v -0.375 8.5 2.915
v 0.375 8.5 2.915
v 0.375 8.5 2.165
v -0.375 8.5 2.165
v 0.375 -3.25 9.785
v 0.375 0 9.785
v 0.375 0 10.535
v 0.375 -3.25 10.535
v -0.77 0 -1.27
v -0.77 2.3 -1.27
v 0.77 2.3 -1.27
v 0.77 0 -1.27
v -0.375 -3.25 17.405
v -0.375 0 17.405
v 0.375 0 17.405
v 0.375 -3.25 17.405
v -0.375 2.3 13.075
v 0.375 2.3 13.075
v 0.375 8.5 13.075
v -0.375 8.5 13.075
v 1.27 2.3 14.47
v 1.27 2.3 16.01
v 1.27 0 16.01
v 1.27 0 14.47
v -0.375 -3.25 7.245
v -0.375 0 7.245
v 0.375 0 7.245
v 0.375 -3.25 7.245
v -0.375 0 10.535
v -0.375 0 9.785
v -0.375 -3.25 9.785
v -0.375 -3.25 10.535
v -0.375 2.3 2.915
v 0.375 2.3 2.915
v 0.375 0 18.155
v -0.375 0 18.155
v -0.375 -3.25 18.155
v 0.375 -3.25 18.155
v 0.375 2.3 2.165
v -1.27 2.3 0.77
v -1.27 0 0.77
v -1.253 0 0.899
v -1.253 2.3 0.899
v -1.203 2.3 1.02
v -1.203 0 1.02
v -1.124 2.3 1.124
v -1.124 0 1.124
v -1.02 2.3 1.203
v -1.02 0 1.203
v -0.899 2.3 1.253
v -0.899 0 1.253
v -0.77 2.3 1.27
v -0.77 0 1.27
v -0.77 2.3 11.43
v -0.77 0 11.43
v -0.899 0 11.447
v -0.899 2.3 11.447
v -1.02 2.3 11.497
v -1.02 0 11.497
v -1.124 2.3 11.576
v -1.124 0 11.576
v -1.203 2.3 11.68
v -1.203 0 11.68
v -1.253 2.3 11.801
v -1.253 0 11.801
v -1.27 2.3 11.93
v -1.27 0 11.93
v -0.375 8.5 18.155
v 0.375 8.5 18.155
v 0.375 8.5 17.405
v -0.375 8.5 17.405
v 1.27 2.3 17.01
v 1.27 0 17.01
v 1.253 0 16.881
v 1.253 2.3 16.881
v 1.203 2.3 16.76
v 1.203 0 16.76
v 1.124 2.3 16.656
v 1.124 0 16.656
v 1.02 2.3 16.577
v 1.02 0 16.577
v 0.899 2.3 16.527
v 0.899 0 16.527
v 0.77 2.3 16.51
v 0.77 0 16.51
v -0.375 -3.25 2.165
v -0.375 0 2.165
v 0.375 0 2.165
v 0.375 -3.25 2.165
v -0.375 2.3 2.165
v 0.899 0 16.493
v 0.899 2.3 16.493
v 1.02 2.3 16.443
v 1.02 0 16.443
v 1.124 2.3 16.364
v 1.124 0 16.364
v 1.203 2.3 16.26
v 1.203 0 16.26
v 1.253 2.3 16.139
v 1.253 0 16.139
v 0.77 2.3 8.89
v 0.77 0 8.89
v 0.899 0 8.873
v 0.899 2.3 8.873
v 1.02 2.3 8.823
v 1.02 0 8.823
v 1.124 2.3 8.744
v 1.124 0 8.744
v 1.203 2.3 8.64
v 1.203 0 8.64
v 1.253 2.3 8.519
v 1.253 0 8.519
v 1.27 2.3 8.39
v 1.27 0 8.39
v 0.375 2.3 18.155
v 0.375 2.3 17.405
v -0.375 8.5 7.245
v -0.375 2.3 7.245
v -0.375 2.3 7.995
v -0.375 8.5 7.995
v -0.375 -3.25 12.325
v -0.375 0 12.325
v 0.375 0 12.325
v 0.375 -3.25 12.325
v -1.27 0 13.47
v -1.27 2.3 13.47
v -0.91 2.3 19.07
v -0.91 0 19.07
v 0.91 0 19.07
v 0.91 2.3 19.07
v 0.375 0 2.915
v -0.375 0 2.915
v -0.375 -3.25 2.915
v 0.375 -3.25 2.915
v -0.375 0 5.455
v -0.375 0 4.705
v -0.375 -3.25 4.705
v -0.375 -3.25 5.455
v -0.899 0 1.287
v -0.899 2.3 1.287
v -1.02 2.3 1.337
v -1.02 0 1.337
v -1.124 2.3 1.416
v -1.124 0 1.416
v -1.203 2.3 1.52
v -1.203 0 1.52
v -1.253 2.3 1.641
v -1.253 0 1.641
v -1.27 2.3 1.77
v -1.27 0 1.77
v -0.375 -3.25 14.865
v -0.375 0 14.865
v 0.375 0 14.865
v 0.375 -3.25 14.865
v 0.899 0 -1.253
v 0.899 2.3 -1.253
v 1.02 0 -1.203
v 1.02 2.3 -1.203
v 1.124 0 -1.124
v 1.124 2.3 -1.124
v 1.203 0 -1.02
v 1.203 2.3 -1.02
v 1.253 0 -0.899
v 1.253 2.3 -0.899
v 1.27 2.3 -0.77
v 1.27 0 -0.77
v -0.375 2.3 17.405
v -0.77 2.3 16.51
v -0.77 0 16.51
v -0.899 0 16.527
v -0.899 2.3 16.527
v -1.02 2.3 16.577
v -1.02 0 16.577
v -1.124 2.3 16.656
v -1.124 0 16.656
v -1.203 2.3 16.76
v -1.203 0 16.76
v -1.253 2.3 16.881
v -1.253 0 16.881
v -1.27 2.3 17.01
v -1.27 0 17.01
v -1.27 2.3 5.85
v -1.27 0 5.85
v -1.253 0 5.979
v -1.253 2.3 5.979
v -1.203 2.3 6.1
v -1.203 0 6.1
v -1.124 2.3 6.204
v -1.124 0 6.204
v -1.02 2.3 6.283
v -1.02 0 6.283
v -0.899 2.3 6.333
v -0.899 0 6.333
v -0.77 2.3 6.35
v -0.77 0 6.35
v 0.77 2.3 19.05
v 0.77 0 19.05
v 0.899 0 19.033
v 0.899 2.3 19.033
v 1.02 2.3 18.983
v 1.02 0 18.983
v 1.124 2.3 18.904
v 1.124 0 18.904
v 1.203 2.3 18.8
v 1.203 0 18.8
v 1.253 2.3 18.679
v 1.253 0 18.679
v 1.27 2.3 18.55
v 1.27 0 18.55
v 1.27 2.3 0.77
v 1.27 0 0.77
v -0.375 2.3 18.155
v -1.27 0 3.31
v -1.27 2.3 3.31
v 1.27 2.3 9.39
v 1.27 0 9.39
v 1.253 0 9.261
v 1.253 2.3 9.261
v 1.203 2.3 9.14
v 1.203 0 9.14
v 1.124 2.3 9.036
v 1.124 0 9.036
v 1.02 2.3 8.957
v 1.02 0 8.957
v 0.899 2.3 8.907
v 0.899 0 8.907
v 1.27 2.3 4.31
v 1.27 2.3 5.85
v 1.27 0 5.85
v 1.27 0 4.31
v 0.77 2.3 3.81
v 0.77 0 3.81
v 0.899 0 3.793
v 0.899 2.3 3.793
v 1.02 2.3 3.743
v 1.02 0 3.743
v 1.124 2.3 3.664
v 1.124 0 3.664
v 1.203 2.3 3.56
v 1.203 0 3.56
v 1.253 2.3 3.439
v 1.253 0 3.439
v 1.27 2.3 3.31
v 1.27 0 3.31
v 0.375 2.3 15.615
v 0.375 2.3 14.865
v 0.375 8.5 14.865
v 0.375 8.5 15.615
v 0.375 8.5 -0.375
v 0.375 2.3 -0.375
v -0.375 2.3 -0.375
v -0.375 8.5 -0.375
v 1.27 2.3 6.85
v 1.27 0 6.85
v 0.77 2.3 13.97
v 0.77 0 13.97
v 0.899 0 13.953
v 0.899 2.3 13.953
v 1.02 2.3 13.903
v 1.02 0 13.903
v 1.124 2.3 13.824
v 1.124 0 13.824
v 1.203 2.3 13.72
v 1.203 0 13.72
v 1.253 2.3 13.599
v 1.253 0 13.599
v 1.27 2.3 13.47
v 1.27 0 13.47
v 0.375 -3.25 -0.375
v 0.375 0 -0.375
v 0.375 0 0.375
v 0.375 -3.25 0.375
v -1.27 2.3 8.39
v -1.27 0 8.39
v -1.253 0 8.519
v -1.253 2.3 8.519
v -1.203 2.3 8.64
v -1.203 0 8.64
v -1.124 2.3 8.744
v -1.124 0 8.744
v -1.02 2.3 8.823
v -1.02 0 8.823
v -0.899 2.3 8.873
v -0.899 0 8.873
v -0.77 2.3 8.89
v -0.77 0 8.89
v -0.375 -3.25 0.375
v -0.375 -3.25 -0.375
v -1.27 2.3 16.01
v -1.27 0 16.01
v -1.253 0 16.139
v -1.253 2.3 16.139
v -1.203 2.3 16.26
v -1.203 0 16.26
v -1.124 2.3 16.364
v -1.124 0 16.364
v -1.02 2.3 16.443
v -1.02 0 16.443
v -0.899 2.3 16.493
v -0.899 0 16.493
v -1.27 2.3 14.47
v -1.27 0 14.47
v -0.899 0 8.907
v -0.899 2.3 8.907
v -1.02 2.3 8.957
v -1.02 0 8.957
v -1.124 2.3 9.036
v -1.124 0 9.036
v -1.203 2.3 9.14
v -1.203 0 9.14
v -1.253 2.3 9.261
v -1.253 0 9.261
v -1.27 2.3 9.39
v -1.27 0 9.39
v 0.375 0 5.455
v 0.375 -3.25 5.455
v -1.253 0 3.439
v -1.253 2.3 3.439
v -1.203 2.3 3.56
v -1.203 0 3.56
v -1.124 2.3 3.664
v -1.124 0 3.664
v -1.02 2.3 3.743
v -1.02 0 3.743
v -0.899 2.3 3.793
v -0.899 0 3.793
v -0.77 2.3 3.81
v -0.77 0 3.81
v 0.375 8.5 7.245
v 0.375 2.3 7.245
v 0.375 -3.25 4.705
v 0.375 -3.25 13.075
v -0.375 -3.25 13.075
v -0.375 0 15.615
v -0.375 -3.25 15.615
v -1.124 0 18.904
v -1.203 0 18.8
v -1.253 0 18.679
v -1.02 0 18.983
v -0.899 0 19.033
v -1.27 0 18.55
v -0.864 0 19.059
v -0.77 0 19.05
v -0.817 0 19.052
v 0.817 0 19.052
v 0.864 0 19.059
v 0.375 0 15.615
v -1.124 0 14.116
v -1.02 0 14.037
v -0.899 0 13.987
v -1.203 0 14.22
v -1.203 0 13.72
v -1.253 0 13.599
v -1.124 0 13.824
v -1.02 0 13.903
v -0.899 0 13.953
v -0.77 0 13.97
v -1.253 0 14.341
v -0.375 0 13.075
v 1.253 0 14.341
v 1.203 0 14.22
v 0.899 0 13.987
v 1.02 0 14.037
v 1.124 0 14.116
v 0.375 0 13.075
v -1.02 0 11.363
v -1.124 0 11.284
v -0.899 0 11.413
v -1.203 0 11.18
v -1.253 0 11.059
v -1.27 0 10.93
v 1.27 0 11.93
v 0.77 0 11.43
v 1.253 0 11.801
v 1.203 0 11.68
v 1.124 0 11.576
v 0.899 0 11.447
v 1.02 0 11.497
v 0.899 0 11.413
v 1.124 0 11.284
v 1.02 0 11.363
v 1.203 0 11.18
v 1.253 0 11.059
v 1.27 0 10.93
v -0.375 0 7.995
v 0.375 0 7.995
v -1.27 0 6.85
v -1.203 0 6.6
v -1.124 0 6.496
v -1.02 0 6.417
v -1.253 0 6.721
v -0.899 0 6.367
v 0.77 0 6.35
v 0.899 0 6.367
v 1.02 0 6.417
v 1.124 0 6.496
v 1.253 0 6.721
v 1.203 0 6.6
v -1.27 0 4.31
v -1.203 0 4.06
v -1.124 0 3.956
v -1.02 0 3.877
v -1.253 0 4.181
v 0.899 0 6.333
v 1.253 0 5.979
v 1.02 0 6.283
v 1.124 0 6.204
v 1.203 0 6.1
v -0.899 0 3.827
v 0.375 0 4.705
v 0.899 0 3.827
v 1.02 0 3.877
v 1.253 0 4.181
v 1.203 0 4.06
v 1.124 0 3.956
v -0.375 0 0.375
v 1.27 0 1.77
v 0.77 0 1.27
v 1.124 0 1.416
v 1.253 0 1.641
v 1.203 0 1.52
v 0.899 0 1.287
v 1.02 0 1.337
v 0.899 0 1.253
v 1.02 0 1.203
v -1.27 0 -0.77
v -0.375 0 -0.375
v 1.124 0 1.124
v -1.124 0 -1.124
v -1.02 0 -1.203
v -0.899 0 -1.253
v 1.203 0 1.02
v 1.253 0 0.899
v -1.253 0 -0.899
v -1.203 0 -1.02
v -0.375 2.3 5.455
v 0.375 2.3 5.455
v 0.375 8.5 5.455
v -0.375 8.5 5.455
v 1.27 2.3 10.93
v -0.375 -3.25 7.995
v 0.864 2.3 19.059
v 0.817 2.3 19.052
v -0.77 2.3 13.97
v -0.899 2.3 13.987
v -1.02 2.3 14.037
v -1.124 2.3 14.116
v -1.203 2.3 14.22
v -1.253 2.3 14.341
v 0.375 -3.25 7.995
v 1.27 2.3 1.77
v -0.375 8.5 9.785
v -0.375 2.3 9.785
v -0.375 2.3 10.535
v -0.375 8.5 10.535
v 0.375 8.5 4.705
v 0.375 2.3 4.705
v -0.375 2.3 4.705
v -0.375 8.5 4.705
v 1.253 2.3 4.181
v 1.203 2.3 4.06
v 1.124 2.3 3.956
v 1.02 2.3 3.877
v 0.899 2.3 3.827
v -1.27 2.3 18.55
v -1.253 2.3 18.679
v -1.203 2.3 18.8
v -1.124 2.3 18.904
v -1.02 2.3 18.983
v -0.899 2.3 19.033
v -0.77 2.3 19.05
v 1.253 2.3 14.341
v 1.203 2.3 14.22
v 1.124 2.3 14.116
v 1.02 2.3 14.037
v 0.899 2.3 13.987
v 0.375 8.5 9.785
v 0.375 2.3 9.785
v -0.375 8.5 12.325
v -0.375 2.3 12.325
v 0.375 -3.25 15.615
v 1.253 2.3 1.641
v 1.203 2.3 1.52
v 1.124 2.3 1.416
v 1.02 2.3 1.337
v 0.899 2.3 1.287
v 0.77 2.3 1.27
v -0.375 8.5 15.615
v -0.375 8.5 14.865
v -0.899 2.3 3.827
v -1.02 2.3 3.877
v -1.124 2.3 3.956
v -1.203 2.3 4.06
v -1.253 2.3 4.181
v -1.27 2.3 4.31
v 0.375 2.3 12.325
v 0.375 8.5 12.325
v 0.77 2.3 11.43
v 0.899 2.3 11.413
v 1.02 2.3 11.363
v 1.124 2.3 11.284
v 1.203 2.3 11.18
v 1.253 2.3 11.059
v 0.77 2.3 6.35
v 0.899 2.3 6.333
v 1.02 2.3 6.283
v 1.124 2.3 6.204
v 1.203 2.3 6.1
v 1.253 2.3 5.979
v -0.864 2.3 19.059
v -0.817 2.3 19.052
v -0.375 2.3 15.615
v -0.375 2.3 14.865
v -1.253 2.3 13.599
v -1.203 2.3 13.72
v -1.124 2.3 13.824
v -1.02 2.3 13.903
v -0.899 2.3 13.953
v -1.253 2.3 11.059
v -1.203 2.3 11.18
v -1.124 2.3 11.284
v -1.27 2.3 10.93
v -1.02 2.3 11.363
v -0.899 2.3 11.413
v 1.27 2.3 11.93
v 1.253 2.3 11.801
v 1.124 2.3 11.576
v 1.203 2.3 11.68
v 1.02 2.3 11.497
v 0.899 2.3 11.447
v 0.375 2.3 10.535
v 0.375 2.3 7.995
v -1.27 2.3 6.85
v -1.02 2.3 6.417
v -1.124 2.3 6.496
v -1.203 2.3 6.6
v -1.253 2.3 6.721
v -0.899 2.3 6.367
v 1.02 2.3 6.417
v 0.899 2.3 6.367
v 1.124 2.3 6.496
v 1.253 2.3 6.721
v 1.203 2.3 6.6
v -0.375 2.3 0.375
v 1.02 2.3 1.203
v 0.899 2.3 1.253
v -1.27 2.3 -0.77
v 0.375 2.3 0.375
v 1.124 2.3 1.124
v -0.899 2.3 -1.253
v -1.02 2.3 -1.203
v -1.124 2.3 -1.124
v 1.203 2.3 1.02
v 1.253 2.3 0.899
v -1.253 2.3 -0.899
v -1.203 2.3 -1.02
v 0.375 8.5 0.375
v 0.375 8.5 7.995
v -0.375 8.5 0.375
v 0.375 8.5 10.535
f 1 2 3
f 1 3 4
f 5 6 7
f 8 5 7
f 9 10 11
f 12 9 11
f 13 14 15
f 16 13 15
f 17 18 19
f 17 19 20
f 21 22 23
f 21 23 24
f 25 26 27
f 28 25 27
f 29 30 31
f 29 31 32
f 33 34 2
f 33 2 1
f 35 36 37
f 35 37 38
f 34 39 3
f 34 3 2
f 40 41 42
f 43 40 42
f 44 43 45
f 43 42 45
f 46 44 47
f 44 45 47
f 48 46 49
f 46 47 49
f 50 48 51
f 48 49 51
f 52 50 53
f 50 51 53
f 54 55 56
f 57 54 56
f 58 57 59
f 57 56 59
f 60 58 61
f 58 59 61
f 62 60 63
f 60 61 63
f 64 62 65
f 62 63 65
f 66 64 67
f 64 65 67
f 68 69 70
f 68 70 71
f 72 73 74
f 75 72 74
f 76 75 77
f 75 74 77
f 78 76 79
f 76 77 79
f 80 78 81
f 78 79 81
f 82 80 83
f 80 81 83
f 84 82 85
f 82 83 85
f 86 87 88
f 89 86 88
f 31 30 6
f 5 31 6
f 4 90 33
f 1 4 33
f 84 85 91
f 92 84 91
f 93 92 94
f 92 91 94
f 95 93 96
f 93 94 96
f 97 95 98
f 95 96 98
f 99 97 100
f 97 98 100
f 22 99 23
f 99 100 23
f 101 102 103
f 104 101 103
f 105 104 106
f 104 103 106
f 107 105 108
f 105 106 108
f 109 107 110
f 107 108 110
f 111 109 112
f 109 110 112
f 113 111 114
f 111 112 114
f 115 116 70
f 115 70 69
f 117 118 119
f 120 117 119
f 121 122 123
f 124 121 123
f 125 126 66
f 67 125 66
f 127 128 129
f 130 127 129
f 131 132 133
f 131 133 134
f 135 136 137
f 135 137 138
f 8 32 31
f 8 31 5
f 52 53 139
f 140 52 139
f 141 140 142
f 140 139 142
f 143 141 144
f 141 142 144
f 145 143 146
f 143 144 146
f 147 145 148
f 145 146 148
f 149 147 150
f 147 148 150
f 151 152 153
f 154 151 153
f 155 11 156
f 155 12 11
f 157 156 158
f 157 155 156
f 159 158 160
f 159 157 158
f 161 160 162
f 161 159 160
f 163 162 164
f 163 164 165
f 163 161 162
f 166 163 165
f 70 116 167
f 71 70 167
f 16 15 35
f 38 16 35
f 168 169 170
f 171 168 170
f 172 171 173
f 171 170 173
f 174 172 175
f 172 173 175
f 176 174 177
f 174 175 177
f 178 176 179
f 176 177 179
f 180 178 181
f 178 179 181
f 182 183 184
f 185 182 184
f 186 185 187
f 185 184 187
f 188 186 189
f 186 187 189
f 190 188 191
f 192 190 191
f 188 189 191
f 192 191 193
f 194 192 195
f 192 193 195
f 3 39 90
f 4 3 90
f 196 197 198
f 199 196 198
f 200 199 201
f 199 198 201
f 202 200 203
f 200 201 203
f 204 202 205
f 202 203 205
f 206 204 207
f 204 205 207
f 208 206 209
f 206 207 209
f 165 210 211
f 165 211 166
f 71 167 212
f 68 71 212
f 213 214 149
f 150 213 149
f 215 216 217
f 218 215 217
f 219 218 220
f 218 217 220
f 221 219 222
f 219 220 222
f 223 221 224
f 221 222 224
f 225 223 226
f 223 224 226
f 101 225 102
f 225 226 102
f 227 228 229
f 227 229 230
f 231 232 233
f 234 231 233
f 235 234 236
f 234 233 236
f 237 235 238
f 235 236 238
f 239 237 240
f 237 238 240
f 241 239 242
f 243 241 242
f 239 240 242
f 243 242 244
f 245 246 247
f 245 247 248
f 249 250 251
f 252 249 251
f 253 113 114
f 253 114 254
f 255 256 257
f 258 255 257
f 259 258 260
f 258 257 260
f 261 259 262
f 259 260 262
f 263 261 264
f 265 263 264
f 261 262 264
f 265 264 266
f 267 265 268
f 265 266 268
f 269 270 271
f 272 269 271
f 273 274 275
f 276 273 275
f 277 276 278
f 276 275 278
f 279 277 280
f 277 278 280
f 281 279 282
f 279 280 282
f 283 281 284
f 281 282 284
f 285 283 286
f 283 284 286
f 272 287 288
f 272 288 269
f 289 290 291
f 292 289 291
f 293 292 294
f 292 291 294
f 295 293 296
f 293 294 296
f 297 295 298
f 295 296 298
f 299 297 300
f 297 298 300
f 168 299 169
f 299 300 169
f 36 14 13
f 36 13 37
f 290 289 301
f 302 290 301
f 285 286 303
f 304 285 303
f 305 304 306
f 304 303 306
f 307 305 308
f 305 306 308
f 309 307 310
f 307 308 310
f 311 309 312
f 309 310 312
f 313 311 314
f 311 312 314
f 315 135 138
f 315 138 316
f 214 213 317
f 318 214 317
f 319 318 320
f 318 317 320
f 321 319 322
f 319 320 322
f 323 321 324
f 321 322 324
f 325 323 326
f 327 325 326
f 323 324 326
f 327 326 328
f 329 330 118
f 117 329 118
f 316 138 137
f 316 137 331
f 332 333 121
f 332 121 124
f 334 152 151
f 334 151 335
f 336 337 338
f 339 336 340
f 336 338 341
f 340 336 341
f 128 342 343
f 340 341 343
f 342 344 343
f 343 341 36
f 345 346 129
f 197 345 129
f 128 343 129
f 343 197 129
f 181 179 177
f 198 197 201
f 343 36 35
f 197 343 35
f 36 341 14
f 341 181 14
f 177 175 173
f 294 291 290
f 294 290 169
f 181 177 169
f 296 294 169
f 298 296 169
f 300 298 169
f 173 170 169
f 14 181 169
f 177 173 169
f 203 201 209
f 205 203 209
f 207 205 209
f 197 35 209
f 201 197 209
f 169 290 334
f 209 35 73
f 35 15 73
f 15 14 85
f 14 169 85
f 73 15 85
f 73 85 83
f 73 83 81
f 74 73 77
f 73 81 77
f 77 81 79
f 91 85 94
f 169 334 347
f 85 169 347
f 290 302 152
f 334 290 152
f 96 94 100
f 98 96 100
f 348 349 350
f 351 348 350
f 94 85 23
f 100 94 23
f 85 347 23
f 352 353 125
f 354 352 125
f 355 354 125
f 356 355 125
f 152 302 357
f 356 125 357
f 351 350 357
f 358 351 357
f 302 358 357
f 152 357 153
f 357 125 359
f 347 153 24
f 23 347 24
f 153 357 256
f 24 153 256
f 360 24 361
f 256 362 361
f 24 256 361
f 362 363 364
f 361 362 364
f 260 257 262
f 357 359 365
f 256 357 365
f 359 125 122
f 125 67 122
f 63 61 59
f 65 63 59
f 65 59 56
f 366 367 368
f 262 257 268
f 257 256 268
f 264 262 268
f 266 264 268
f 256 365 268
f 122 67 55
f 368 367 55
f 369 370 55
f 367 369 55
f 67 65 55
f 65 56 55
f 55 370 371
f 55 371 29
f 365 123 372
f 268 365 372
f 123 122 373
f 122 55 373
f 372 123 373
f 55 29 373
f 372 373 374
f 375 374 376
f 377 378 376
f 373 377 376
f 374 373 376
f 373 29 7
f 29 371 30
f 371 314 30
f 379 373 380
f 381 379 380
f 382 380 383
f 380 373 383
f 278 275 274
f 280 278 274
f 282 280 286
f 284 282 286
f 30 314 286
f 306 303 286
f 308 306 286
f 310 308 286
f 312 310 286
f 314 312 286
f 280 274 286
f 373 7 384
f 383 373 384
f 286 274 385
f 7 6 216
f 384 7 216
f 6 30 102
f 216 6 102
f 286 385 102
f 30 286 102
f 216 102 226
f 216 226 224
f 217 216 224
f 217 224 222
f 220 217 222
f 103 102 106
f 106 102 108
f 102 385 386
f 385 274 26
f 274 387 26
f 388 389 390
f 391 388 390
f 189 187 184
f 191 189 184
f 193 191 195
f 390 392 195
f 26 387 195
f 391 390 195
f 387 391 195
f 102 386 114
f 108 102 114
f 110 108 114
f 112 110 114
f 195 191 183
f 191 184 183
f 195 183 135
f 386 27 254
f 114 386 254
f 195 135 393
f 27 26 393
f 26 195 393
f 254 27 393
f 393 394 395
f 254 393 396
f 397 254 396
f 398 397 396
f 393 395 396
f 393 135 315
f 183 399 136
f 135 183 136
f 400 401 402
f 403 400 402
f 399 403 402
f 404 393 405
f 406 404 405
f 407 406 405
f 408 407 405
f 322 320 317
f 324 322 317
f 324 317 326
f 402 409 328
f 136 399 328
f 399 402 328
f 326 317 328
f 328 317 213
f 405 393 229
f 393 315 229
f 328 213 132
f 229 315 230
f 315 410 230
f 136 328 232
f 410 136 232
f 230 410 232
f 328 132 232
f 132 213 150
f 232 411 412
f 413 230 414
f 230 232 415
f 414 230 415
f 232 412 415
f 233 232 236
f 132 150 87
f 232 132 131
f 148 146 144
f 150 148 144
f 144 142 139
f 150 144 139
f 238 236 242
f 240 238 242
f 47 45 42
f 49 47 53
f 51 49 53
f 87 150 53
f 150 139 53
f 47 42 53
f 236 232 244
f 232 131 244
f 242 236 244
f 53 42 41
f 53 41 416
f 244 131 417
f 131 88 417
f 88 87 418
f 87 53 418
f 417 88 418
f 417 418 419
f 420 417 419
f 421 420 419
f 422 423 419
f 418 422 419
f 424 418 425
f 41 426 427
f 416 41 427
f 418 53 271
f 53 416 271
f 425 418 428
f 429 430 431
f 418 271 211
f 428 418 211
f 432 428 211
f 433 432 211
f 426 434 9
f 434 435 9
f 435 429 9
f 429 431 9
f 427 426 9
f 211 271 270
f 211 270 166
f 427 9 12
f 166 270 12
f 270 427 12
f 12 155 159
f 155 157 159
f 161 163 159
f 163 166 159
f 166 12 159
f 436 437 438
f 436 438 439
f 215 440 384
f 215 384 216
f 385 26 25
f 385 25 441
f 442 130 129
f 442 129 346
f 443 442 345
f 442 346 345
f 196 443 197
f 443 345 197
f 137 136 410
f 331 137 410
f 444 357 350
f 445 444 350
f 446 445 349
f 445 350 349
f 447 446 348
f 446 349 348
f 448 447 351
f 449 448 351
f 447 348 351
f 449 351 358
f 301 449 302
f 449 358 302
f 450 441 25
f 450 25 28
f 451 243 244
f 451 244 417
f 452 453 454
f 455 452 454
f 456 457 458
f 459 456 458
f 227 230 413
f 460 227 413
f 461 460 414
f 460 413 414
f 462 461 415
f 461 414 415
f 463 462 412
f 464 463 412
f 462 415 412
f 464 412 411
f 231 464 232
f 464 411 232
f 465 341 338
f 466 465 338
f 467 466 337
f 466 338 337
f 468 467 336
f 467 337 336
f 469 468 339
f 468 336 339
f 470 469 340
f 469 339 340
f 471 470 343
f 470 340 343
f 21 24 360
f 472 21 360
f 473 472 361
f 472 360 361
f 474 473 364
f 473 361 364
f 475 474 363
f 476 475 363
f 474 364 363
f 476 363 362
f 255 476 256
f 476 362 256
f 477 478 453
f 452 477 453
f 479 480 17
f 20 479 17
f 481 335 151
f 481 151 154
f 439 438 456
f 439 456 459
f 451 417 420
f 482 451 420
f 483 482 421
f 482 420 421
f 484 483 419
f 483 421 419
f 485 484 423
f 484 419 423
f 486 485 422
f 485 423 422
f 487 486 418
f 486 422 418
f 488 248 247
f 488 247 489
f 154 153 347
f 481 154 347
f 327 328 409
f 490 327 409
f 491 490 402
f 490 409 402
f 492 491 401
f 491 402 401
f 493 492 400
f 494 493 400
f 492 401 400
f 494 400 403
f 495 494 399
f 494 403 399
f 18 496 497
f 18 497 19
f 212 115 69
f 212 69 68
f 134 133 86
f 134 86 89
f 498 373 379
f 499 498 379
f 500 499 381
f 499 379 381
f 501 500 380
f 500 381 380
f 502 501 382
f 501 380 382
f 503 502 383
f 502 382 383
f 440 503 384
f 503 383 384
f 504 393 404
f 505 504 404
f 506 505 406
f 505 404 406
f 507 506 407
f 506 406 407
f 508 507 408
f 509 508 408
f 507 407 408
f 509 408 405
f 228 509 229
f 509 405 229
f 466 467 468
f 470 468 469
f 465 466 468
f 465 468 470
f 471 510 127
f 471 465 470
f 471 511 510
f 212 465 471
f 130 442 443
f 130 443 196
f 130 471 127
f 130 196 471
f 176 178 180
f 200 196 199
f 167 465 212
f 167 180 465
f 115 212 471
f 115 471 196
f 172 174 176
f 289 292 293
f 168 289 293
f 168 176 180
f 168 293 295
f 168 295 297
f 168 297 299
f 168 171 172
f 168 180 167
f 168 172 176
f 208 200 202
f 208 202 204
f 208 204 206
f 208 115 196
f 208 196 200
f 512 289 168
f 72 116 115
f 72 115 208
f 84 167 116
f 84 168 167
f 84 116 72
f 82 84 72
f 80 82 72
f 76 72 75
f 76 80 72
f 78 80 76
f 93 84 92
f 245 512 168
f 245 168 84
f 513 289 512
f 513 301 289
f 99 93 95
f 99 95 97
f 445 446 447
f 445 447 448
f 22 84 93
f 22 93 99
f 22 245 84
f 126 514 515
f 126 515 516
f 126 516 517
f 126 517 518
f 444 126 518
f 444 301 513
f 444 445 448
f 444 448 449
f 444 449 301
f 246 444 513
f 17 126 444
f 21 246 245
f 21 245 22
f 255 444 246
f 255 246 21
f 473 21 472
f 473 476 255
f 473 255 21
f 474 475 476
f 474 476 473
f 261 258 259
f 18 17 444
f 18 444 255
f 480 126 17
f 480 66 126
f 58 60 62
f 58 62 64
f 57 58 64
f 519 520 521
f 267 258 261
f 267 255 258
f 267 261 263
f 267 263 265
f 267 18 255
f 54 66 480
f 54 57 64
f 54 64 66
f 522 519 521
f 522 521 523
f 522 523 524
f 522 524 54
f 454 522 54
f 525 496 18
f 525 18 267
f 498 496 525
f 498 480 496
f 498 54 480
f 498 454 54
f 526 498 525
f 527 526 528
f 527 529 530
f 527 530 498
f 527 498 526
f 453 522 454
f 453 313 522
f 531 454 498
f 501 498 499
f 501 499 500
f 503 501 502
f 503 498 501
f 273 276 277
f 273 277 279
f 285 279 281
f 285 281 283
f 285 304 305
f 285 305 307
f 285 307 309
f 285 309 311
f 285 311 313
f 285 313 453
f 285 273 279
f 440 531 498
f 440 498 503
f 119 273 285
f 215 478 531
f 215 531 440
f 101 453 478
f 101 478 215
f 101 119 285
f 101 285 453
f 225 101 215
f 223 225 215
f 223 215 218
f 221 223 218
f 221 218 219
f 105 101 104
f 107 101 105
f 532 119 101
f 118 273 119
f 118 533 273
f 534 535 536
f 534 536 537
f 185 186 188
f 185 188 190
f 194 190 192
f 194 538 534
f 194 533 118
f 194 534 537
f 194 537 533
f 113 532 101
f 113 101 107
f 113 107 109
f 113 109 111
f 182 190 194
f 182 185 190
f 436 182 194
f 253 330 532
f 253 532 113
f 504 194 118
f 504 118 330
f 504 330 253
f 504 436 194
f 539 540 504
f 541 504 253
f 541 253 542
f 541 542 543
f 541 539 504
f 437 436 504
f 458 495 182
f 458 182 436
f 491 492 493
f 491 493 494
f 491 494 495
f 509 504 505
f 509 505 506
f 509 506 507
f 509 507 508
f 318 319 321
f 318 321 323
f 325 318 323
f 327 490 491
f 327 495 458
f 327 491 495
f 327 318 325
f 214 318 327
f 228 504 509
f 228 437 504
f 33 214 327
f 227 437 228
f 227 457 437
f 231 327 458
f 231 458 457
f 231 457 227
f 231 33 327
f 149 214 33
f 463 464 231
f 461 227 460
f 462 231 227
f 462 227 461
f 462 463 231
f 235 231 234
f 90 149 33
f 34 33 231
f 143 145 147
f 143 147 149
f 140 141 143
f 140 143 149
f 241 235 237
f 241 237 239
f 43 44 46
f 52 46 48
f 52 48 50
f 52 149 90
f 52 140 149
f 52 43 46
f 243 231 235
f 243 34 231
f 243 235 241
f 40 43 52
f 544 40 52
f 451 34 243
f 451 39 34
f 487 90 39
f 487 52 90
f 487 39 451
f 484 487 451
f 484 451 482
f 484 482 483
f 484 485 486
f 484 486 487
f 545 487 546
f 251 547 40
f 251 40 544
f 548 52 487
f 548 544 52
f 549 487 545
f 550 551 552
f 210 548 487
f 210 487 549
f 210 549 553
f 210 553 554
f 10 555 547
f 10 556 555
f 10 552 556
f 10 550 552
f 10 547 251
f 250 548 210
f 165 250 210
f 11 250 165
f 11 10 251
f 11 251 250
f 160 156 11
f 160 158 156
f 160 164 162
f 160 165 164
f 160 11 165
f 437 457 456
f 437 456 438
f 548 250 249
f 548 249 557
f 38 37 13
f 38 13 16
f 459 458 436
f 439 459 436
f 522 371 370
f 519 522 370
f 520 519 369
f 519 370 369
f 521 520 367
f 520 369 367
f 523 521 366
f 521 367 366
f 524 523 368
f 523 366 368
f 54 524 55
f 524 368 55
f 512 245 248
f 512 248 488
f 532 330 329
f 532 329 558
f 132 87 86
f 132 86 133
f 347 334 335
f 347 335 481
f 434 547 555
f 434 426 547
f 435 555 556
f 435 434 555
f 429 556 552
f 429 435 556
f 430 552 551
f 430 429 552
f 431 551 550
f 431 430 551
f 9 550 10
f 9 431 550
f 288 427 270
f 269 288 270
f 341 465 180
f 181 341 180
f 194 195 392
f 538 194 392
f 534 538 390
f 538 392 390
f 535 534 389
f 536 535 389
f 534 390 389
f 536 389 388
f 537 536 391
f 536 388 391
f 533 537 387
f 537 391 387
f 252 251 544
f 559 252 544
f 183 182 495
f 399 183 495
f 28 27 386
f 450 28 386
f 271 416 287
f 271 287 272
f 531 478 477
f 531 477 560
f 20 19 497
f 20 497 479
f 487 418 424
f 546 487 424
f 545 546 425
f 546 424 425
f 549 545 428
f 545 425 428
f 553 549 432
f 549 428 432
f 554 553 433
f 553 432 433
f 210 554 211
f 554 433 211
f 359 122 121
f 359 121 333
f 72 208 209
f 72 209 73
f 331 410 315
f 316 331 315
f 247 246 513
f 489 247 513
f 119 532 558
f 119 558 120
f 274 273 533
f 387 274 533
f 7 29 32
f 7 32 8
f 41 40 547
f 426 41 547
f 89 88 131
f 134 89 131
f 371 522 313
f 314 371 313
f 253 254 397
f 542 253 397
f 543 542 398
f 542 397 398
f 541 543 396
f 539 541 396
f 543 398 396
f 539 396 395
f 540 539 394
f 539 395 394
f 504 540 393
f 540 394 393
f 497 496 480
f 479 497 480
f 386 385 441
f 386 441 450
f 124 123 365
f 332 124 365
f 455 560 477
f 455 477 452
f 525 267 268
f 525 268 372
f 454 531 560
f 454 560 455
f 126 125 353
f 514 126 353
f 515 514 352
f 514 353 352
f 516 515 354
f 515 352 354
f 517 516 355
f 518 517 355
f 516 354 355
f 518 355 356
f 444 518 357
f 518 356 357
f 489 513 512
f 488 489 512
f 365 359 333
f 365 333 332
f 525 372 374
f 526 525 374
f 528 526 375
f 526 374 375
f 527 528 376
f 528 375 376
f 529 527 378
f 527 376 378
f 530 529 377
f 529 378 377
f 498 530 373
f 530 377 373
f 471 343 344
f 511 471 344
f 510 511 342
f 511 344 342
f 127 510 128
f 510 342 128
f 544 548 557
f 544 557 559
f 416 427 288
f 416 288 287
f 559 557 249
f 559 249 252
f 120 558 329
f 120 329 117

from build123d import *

# Parameters (mm, degrees)
CROQUIS1_W               = 2.54
CROQUIS1_H               = 20.34
SALIENTE_EXTRUIR1_DEPTH  = 2.3
CORTAR_EXTRUIR4_DEPTH    = 2.3
CORTAR_EXTRUIR5_DEPTH    = 2.3
CORTAR_EXTRUIR6_DEPTH    = 2.3
CORTAR_EXTRUIR7_DEPTH    = 2.3
CORTAR_EXTRUIR8_DEPTH    = 2.3
CORTAR_EXTRUIR9_DEPTH    = 2.3
CORTAR_EXTRUIR10_DEPTH   = 2.3
CORTAR_EXTRUIR11_DEPTH   = 2.3
CORTAR_EXTRUIR12_DEPTH   = 2.3
CORTAR_EXTRUIR13_DEPTH   = 2.3
CORTAR_EXTRUIR14_DEPTH   = 2.3
CORTAR_EXTRUIR15_DEPTH   = 2.3
CORTAR_EXTRUIR16_DEPTH   = 2.3
CORTAR_EXTRUIR17_DEPTH   = 2.3
CORTAR_EXTRUIR18_DEPTH   = 2.3
CORTAR_EXTRUIR19_DEPTH   = 2.3
CROQUIS24_W              = 0.75
CROQUIS24_H              = 0.75
SALIENTE_EXTRUIR2_DEPTH  = 3.25
CROQUIS25_W              = 0.75
CROQUIS25_H              = 0.75
SALIENTE_EXTRUIR3_DEPTH  = 6.2
CROQUIS26_W              = 0.75
CROQUIS26_H              = 0.75
SALIENTE_EXTRUIR4_DEPTH  = 6.2
CROQUIS27_W              = 0.75
CROQUIS27_H              = 0.75
SALIENTE_EXTRUIR5_DEPTH  = 6.2
CROQUIS28_W              = 0.75
CROQUIS28_H              = 0.75
SALIENTE_EXTRUIR6_DEPTH  = 6.2
CROQUIS29_W              = 0.75
CROQUIS29_H              = 0.75
SALIENTE_EXTRUIR7_DEPTH  = 6.2
CROQUIS30_W              = 0.75
CROQUIS30_H              = 0.75
SALIENTE_EXTRUIR8_DEPTH  = 6.2
CROQUIS31_W              = 0.75
CROQUIS31_H              = 0.75
SALIENTE_EXTRUIR9_DEPTH  = 6.2
CROQUIS32_W              = 0.75
CROQUIS32_H              = 0.75
SALIENTE_EXTRUIR10_DEPTH = 6.2
CROQUIS37_W              = 0.75
CROQUIS37_H              = 0.75
SALIENTE_EXTRUIR15_DEPTH = 3.25
CROQUIS38_W              = 0.75
CROQUIS38_H              = 0.75
SALIENTE_EXTRUIR16_DEPTH = 3.25
CROQUIS39_W              = 0.75
CROQUIS39_H              = 0.75
SALIENTE_EXTRUIR17_DEPTH = 3.25
CROQUIS40_W              = 0.75
CROQUIS40_H              = 0.75
SALIENTE_EXTRUIR18_DEPTH = 3.25
CROQUIS41_W              = 0.75
CROQUIS41_H              = 0.75
SALIENTE_EXTRUIR19_DEPTH = 3.25
CROQUIS42_W              = 0.75
CROQUIS42_H              = 0.75
SALIENTE_EXTRUIR20_DEPTH = 3.25
CROQUIS43_W              = 0.75
CROQUIS43_H              = 0.75
SALIENTE_EXTRUIR21_DEPTH = 3.25
REDONDEO2_R              = 0.5


with BuildPart() as part:
    # Croquis1 → Saliente-Extruir1 (new body)
    with BuildSketch(Plane(origin=(0, 2.3, 0), x_dir=(1, 0, 0), z_dir=(0, 1, 0))):
        with Locations((0, -8.9)):
            Rectangle(CROQUIS1_W, CROQUIS1_H)
    extrude(amount=-SALIENTE_EXTRUIR1_DEPTH)

    # Croquis5 → Cortar-Extruir4 (cut)
    with BuildSketch(Plane.XZ):
        with BuildLine():
            Line((1.27, 18.55), (1.27, 19.55))
            ThreePointArc((1.27, 19.55), (1.123553391, 19.196446609), (0.77, 19.05))
            ThreePointArc((0.77, 19.05), (1.123553391, 18.903553391), (1.27, 18.55))
        make_face()
    extrude(amount=-CORTAR_EXTRUIR4_DEPTH, mode=Mode.SUBTRACT)

    # Croquis6 → Cortar-Extruir5 (cut)
    with BuildSketch(Plane.XZ):
        with BuildLine():
            Line((1.27, 16.01), (1.27, 17.01))
            ThreePointArc((1.27, 17.01), (1.123553391, 16.656446609), (0.77, 16.51))
            ThreePointArc((0.77, 16.51), (1.123553391, 16.363553391), (1.27, 16.01))
        make_face()
    extrude(amount=-CORTAR_EXTRUIR5_DEPTH, mode=Mode.SUBTRACT)

    # Croquis7 → Cortar-Extruir6 (cut)
    with BuildSketch(Plane.XZ):
        with BuildLine():
            Line((1.27, 13.47), (1.27, 14.47))
            ThreePointArc((1.27, 14.47), (1.123553391, 14.116446609), (0.77, 13.97))
            ThreePointArc((0.77, 13.97), (1.123553391, 13.823553391), (1.27, 13.47))
        make_face()
    extrude(amount=-CORTAR_EXTRUIR6_DEPTH, mode=Mode.SUBTRACT)

    # Croquis8 → Cortar-Extruir7 (cut)
    with BuildSketch(Plane.XZ):
        with BuildLine():
            Line((1.27, 10.93), (1.27, 11.93))
            ThreePointArc((1.27, 11.93), (1.123553391, 11.576446609), (0.77, 11.43))
            ThreePointArc((0.77, 11.43), (1.123553391, 11.283553391), (1.27, 10.93))
        make_face()
    extrude(amount=-CORTAR_EXTRUIR7_DEPTH, mode=Mode.SUBTRACT)

    # Croquis9 → Cortar-Extruir8 (cut)
    with BuildSketch(Plane.XZ):
        with BuildLine():
            Line((1.27, 8.39), (1.27, 9.39))
            ThreePointArc((1.27, 9.39), (1.123553391, 9.036446609), (0.77, 8.89))
            ThreePointArc((0.77, 8.89), (1.123553391, 8.743553391), (1.27, 8.39))
        make_face()
    extrude(amount=-CORTAR_EXTRUIR8_DEPTH, mode=Mode.SUBTRACT)

    # Croquis10 → Cortar-Extruir9 (cut)
    with BuildSketch(Plane.XZ):
        with BuildLine():
            Line((1.27, 5.85), (1.27, 6.85))
            ThreePointArc((1.27, 6.85), (1.123553391, 6.496446609), (0.77, 6.35))
            ThreePointArc((0.77, 6.35), (1.123553391, 6.203553391), (1.27, 5.85))
        make_face()
    extrude(amount=-CORTAR_EXTRUIR9_DEPTH, mode=Mode.SUBTRACT)

    # Croquis11 → Cortar-Extruir10 (cut)
    with BuildSketch(Plane.XZ):
        with BuildLine():
            Line((1.27, 3.31), (1.27, 4.31))
            ThreePointArc((1.27, 4.31), (1.123553391, 3.956446609), (0.77, 3.81))
            ThreePointArc((0.77, 3.81), (1.123553391, 3.663553391), (1.27, 3.31))
        make_face()
    extrude(amount=-CORTAR_EXTRUIR10_DEPTH, mode=Mode.SUBTRACT)

    # Croquis12 → Cortar-Extruir11 (cut)
    with BuildSketch(Plane.XZ):
        with BuildLine():
            Line((1.27, 0.77), (1.27, 1.77))
            ThreePointArc((1.27, 1.77), (1.123553391, 1.416446609), (0.77, 1.27))
            ThreePointArc((0.77, 1.27), (1.123553391, 1.123553391), (1.27, 0.77))
        make_face()
    extrude(amount=-CORTAR_EXTRUIR11_DEPTH, mode=Mode.SUBTRACT)

    # Croquis13 → Cortar-Extruir12 (cut)
    with BuildSketch(Plane.XZ):
        with BuildLine():
            Line((-1.27, 1.77), (-1.27, 0.77))
            ThreePointArc((-1.27, 0.77), (-1.123553391, 1.123553391), (-0.77, 1.27))
            ThreePointArc((-0.77, 1.27), (-1.123553391, 1.416446609), (-1.27, 1.77))
        make_face()
    extrude(amount=-CORTAR_EXTRUIR12_DEPTH, mode=Mode.SUBTRACT)

    # Croquis14 → Cortar-Extruir13 (cut)
    with BuildSketch(Plane.XZ):
        with BuildLine():
            Line((-1.27, 4.31), (-1.27, 3.31))
            ThreePointArc((-1.27, 3.31), (-1.123553391, 3.663553391), (-0.77, 3.81))
            ThreePointArc((-0.77, 3.81), (-1.123553391, 3.956446609), (-1.27, 4.31))
        make_face()
    extrude(amount=-CORTAR_EXTRUIR13_DEPTH, mode=Mode.SUBTRACT)

    # Croquis15 → Cortar-Extruir14 (cut)
    with BuildSketch(Plane.XZ):
        with BuildLine():
            Line((-1.27, 6.85), (-1.27, 5.85))
            ThreePointArc((-1.27, 5.85), (-1.123553391, 6.203553391), (-0.77, 6.35))
            ThreePointArc((-0.77, 6.35), (-1.123553391, 6.496446609), (-1.27, 6.85))
        make_face()
    extrude(amount=-CORTAR_EXTRUIR14_DEPTH, mode=Mode.SUBTRACT)

    # Croquis16 → Cortar-Extruir15 (cut)
    with BuildSketch(Plane.XZ):
        with BuildLine():
            Line((-1.27, 9.39), (-1.27, 8.39))
            ThreePointArc((-1.27, 8.39), (-1.123553391, 8.743553391), (-0.77, 8.89))
            ThreePointArc((-0.77, 8.89), (-1.123553391, 9.036446609), (-1.27, 9.39))
        make_face()
    extrude(amount=-CORTAR_EXTRUIR15_DEPTH, mode=Mode.SUBTRACT)

    # Croquis17 → Cortar-Extruir16 (cut)
    with BuildSketch(Plane.XZ):
        with BuildLine():
            Line((-1.27, 11.93), (-1.27, 10.93))
            ThreePointArc((-1.27, 10.93), (-1.123553391, 11.283553391), (-0.77, 11.43))
            ThreePointArc((-0.77, 11.43), (-1.123553391, 11.576446609), (-1.27, 11.93))
        make_face()
    extrude(amount=-CORTAR_EXTRUIR16_DEPTH, mode=Mode.SUBTRACT)

    # Croquis18 → Cortar-Extruir17 (cut)
    with BuildSketch(Plane.XZ):
        with BuildLine():
            Line((-1.27, 14.47), (-1.27, 13.47))
            ThreePointArc((-1.27, 13.47), (-1.123553391, 13.823553391), (-0.77, 13.97))
            ThreePointArc((-0.77, 13.97), (-1.123553391, 14.116446609), (-1.27, 14.47))
        make_face()
    extrude(amount=-CORTAR_EXTRUIR17_DEPTH, mode=Mode.SUBTRACT)

    # Croquis19 → Cortar-Extruir18 (cut)
    with BuildSketch(Plane.XZ):
        with BuildLine():
            Line((-1.27, 17.01), (-1.27, 16.01))
            ThreePointArc((-1.27, 16.01), (-1.123553391, 16.363553391), (-0.77, 16.51))
            ThreePointArc((-0.77, 16.51), (-1.123553391, 16.656446609), (-1.27, 17.01))
        make_face()
    extrude(amount=-CORTAR_EXTRUIR18_DEPTH, mode=Mode.SUBTRACT)

    # Croquis20 → Cortar-Extruir19 (cut)
    with BuildSketch(Plane.XZ):
        with BuildLine():
            Line((-1.27, 19.55), (-1.27, 18.55))
            ThreePointArc((-1.27, 18.55), (-1.123553391, 18.903553391), (-0.77, 19.05))
            ThreePointArc((-0.77, 19.05), (-1.123553391, 19.196446609), (-1.27, 19.55))
        make_face()
    extrude(amount=-CORTAR_EXTRUIR19_DEPTH, mode=Mode.SUBTRACT)

    # Croquis24 → Saliente-Extruir2 (add)
    with BuildSketch(Plane.XZ):
        Rectangle(CROQUIS24_W, CROQUIS24_H)
    extrude(amount=SALIENTE_EXTRUIR2_DEPTH)

    # Croquis25 → Saliente-Extruir3 (add)
    with BuildSketch(Plane(origin=(0, 2.3, 0), x_dir=(-1, 0, 0), z_dir=(0, 1, 0))):
        Rectangle(CROQUIS25_W, CROQUIS25_H)
    extrude(amount=SALIENTE_EXTRUIR3_DEPTH)

    # Croquis26 → Saliente-Extruir4 (add)
    with BuildSketch(Plane(origin=(0, 2.3, 0), x_dir=(-1, 0, 0), z_dir=(0, 1, 0))):
        with Locations((0, 2.54)):
            Rectangle(CROQUIS26_W, CROQUIS26_H)
    extrude(amount=SALIENTE_EXTRUIR4_DEPTH)

    # Croquis27 → Saliente-Extruir5 (add)
    with BuildSketch(Plane(origin=(0, 2.3, 0), x_dir=(-1, 0, 0), z_dir=(0, 1, 0))):
        with Locations((0, 5.08)):
            Rectangle(CROQUIS27_W, CROQUIS27_H)
    extrude(amount=SALIENTE_EXTRUIR5_DEPTH)

    # Croquis28 → Saliente-Extruir6 (add)
    with BuildSketch(Plane(origin=(0, 2.3, 0), x_dir=(-1, 0, 0), z_dir=(0, 1, 0))):
        with Locations((0, 7.62)):
            Rectangle(CROQUIS28_W, CROQUIS28_H)
    extrude(amount=SALIENTE_EXTRUIR6_DEPTH)

    # Croquis29 → Saliente-Extruir7 (add)
    with BuildSketch(Plane(origin=(0, 2.3, 0), x_dir=(-1, 0, 0), z_dir=(0, 1, 0))):
        with Locations((0, 10.16)):
            Rectangle(CROQUIS29_W, CROQUIS29_H)
    extrude(amount=SALIENTE_EXTRUIR7_DEPTH)

    # Croquis30 → Saliente-Extruir8 (add)
    with BuildSketch(Plane(origin=(0, 2.3, 0), x_dir=(-1, 0, 0), z_dir=(0, 1, 0))):
        with Locations((0, 12.7)):
            Rectangle(CROQUIS30_W, CROQUIS30_H)
    extrude(amount=SALIENTE_EXTRUIR8_DEPTH)

    # Croquis31 → Saliente-Extruir9 (add)
    with BuildSketch(Plane(origin=(0, 2.3, 0), x_dir=(-1, 0, 0), z_dir=(0, 1, 0))):
        with Locations((0, 15.24)):
            Rectangle(CROQUIS31_W, CROQUIS31_H)
    extrude(amount=SALIENTE_EXTRUIR9_DEPTH)

    # Croquis32 → Saliente-Extruir10 (add)
    with BuildSketch(Plane(origin=(0, 2.3, 0), x_dir=(-1, 0, 0), z_dir=(0, 1, 0))):
        with Locations((0, 17.78)):
            Rectangle(CROQUIS32_W, CROQUIS32_H)
    extrude(amount=SALIENTE_EXTRUIR10_DEPTH)

    # Croquis37 → Saliente-Extruir15 (add)
    with BuildSketch(Plane.XZ):
        with Locations((0, 2.54)):
            Rectangle(CROQUIS37_W, CROQUIS37_H)
    extrude(amount=SALIENTE_EXTRUIR15_DEPTH)

    # Croquis38 → Saliente-Extruir16 (add)
    with BuildSketch(Plane.XZ):
        with Locations((0, 5.08)):
            Rectangle(CROQUIS38_W, CROQUIS38_H)
    extrude(amount=SALIENTE_EXTRUIR16_DEPTH)

    # Croquis39 → Saliente-Extruir17 (add)
    with BuildSketch(Plane.XZ):
        with Locations((0, 7.62)):
            Rectangle(CROQUIS39_W, CROQUIS39_H)
    extrude(amount=SALIENTE_EXTRUIR17_DEPTH)

    # Croquis40 → Saliente-Extruir18 (add)
    with BuildSketch(Plane.XZ):
        with Locations((0, 10.16)):
            Rectangle(CROQUIS40_W, CROQUIS40_H)
    extrude(amount=SALIENTE_EXTRUIR18_DEPTH)

    # Croquis41 → Saliente-Extruir19 (add)
    with BuildSketch(Plane.XZ):
        with Locations((0, 12.7)):
            Rectangle(CROQUIS41_W, CROQUIS41_H)
    extrude(amount=SALIENTE_EXTRUIR19_DEPTH)

    # Croquis42 → Saliente-Extruir20 (add)
    with BuildSketch(Plane.XZ):
        with Locations((0, 15.24)):
            Rectangle(CROQUIS42_W, CROQUIS42_H)
    extrude(amount=SALIENTE_EXTRUIR20_DEPTH)

    # Croquis43 → Saliente-Extruir21 (add)
    with BuildSketch(Plane.XZ):
        with Locations((0, 17.78)):
            Rectangle(CROQUIS43_W, CROQUIS43_H)
    extrude(amount=SALIENTE_EXTRUIR21_DEPTH)

    # Redondeo2
    redondeo2_edges = [part.edges().sort_by_distance(p)[0] for p in [
        (-1.27, 1.15, -1.27),
        (1.27, 1.15, -1.27),
    ]]
    fillet(redondeo2_edges, radius=REDONDEO2_R)


solid = part.part
